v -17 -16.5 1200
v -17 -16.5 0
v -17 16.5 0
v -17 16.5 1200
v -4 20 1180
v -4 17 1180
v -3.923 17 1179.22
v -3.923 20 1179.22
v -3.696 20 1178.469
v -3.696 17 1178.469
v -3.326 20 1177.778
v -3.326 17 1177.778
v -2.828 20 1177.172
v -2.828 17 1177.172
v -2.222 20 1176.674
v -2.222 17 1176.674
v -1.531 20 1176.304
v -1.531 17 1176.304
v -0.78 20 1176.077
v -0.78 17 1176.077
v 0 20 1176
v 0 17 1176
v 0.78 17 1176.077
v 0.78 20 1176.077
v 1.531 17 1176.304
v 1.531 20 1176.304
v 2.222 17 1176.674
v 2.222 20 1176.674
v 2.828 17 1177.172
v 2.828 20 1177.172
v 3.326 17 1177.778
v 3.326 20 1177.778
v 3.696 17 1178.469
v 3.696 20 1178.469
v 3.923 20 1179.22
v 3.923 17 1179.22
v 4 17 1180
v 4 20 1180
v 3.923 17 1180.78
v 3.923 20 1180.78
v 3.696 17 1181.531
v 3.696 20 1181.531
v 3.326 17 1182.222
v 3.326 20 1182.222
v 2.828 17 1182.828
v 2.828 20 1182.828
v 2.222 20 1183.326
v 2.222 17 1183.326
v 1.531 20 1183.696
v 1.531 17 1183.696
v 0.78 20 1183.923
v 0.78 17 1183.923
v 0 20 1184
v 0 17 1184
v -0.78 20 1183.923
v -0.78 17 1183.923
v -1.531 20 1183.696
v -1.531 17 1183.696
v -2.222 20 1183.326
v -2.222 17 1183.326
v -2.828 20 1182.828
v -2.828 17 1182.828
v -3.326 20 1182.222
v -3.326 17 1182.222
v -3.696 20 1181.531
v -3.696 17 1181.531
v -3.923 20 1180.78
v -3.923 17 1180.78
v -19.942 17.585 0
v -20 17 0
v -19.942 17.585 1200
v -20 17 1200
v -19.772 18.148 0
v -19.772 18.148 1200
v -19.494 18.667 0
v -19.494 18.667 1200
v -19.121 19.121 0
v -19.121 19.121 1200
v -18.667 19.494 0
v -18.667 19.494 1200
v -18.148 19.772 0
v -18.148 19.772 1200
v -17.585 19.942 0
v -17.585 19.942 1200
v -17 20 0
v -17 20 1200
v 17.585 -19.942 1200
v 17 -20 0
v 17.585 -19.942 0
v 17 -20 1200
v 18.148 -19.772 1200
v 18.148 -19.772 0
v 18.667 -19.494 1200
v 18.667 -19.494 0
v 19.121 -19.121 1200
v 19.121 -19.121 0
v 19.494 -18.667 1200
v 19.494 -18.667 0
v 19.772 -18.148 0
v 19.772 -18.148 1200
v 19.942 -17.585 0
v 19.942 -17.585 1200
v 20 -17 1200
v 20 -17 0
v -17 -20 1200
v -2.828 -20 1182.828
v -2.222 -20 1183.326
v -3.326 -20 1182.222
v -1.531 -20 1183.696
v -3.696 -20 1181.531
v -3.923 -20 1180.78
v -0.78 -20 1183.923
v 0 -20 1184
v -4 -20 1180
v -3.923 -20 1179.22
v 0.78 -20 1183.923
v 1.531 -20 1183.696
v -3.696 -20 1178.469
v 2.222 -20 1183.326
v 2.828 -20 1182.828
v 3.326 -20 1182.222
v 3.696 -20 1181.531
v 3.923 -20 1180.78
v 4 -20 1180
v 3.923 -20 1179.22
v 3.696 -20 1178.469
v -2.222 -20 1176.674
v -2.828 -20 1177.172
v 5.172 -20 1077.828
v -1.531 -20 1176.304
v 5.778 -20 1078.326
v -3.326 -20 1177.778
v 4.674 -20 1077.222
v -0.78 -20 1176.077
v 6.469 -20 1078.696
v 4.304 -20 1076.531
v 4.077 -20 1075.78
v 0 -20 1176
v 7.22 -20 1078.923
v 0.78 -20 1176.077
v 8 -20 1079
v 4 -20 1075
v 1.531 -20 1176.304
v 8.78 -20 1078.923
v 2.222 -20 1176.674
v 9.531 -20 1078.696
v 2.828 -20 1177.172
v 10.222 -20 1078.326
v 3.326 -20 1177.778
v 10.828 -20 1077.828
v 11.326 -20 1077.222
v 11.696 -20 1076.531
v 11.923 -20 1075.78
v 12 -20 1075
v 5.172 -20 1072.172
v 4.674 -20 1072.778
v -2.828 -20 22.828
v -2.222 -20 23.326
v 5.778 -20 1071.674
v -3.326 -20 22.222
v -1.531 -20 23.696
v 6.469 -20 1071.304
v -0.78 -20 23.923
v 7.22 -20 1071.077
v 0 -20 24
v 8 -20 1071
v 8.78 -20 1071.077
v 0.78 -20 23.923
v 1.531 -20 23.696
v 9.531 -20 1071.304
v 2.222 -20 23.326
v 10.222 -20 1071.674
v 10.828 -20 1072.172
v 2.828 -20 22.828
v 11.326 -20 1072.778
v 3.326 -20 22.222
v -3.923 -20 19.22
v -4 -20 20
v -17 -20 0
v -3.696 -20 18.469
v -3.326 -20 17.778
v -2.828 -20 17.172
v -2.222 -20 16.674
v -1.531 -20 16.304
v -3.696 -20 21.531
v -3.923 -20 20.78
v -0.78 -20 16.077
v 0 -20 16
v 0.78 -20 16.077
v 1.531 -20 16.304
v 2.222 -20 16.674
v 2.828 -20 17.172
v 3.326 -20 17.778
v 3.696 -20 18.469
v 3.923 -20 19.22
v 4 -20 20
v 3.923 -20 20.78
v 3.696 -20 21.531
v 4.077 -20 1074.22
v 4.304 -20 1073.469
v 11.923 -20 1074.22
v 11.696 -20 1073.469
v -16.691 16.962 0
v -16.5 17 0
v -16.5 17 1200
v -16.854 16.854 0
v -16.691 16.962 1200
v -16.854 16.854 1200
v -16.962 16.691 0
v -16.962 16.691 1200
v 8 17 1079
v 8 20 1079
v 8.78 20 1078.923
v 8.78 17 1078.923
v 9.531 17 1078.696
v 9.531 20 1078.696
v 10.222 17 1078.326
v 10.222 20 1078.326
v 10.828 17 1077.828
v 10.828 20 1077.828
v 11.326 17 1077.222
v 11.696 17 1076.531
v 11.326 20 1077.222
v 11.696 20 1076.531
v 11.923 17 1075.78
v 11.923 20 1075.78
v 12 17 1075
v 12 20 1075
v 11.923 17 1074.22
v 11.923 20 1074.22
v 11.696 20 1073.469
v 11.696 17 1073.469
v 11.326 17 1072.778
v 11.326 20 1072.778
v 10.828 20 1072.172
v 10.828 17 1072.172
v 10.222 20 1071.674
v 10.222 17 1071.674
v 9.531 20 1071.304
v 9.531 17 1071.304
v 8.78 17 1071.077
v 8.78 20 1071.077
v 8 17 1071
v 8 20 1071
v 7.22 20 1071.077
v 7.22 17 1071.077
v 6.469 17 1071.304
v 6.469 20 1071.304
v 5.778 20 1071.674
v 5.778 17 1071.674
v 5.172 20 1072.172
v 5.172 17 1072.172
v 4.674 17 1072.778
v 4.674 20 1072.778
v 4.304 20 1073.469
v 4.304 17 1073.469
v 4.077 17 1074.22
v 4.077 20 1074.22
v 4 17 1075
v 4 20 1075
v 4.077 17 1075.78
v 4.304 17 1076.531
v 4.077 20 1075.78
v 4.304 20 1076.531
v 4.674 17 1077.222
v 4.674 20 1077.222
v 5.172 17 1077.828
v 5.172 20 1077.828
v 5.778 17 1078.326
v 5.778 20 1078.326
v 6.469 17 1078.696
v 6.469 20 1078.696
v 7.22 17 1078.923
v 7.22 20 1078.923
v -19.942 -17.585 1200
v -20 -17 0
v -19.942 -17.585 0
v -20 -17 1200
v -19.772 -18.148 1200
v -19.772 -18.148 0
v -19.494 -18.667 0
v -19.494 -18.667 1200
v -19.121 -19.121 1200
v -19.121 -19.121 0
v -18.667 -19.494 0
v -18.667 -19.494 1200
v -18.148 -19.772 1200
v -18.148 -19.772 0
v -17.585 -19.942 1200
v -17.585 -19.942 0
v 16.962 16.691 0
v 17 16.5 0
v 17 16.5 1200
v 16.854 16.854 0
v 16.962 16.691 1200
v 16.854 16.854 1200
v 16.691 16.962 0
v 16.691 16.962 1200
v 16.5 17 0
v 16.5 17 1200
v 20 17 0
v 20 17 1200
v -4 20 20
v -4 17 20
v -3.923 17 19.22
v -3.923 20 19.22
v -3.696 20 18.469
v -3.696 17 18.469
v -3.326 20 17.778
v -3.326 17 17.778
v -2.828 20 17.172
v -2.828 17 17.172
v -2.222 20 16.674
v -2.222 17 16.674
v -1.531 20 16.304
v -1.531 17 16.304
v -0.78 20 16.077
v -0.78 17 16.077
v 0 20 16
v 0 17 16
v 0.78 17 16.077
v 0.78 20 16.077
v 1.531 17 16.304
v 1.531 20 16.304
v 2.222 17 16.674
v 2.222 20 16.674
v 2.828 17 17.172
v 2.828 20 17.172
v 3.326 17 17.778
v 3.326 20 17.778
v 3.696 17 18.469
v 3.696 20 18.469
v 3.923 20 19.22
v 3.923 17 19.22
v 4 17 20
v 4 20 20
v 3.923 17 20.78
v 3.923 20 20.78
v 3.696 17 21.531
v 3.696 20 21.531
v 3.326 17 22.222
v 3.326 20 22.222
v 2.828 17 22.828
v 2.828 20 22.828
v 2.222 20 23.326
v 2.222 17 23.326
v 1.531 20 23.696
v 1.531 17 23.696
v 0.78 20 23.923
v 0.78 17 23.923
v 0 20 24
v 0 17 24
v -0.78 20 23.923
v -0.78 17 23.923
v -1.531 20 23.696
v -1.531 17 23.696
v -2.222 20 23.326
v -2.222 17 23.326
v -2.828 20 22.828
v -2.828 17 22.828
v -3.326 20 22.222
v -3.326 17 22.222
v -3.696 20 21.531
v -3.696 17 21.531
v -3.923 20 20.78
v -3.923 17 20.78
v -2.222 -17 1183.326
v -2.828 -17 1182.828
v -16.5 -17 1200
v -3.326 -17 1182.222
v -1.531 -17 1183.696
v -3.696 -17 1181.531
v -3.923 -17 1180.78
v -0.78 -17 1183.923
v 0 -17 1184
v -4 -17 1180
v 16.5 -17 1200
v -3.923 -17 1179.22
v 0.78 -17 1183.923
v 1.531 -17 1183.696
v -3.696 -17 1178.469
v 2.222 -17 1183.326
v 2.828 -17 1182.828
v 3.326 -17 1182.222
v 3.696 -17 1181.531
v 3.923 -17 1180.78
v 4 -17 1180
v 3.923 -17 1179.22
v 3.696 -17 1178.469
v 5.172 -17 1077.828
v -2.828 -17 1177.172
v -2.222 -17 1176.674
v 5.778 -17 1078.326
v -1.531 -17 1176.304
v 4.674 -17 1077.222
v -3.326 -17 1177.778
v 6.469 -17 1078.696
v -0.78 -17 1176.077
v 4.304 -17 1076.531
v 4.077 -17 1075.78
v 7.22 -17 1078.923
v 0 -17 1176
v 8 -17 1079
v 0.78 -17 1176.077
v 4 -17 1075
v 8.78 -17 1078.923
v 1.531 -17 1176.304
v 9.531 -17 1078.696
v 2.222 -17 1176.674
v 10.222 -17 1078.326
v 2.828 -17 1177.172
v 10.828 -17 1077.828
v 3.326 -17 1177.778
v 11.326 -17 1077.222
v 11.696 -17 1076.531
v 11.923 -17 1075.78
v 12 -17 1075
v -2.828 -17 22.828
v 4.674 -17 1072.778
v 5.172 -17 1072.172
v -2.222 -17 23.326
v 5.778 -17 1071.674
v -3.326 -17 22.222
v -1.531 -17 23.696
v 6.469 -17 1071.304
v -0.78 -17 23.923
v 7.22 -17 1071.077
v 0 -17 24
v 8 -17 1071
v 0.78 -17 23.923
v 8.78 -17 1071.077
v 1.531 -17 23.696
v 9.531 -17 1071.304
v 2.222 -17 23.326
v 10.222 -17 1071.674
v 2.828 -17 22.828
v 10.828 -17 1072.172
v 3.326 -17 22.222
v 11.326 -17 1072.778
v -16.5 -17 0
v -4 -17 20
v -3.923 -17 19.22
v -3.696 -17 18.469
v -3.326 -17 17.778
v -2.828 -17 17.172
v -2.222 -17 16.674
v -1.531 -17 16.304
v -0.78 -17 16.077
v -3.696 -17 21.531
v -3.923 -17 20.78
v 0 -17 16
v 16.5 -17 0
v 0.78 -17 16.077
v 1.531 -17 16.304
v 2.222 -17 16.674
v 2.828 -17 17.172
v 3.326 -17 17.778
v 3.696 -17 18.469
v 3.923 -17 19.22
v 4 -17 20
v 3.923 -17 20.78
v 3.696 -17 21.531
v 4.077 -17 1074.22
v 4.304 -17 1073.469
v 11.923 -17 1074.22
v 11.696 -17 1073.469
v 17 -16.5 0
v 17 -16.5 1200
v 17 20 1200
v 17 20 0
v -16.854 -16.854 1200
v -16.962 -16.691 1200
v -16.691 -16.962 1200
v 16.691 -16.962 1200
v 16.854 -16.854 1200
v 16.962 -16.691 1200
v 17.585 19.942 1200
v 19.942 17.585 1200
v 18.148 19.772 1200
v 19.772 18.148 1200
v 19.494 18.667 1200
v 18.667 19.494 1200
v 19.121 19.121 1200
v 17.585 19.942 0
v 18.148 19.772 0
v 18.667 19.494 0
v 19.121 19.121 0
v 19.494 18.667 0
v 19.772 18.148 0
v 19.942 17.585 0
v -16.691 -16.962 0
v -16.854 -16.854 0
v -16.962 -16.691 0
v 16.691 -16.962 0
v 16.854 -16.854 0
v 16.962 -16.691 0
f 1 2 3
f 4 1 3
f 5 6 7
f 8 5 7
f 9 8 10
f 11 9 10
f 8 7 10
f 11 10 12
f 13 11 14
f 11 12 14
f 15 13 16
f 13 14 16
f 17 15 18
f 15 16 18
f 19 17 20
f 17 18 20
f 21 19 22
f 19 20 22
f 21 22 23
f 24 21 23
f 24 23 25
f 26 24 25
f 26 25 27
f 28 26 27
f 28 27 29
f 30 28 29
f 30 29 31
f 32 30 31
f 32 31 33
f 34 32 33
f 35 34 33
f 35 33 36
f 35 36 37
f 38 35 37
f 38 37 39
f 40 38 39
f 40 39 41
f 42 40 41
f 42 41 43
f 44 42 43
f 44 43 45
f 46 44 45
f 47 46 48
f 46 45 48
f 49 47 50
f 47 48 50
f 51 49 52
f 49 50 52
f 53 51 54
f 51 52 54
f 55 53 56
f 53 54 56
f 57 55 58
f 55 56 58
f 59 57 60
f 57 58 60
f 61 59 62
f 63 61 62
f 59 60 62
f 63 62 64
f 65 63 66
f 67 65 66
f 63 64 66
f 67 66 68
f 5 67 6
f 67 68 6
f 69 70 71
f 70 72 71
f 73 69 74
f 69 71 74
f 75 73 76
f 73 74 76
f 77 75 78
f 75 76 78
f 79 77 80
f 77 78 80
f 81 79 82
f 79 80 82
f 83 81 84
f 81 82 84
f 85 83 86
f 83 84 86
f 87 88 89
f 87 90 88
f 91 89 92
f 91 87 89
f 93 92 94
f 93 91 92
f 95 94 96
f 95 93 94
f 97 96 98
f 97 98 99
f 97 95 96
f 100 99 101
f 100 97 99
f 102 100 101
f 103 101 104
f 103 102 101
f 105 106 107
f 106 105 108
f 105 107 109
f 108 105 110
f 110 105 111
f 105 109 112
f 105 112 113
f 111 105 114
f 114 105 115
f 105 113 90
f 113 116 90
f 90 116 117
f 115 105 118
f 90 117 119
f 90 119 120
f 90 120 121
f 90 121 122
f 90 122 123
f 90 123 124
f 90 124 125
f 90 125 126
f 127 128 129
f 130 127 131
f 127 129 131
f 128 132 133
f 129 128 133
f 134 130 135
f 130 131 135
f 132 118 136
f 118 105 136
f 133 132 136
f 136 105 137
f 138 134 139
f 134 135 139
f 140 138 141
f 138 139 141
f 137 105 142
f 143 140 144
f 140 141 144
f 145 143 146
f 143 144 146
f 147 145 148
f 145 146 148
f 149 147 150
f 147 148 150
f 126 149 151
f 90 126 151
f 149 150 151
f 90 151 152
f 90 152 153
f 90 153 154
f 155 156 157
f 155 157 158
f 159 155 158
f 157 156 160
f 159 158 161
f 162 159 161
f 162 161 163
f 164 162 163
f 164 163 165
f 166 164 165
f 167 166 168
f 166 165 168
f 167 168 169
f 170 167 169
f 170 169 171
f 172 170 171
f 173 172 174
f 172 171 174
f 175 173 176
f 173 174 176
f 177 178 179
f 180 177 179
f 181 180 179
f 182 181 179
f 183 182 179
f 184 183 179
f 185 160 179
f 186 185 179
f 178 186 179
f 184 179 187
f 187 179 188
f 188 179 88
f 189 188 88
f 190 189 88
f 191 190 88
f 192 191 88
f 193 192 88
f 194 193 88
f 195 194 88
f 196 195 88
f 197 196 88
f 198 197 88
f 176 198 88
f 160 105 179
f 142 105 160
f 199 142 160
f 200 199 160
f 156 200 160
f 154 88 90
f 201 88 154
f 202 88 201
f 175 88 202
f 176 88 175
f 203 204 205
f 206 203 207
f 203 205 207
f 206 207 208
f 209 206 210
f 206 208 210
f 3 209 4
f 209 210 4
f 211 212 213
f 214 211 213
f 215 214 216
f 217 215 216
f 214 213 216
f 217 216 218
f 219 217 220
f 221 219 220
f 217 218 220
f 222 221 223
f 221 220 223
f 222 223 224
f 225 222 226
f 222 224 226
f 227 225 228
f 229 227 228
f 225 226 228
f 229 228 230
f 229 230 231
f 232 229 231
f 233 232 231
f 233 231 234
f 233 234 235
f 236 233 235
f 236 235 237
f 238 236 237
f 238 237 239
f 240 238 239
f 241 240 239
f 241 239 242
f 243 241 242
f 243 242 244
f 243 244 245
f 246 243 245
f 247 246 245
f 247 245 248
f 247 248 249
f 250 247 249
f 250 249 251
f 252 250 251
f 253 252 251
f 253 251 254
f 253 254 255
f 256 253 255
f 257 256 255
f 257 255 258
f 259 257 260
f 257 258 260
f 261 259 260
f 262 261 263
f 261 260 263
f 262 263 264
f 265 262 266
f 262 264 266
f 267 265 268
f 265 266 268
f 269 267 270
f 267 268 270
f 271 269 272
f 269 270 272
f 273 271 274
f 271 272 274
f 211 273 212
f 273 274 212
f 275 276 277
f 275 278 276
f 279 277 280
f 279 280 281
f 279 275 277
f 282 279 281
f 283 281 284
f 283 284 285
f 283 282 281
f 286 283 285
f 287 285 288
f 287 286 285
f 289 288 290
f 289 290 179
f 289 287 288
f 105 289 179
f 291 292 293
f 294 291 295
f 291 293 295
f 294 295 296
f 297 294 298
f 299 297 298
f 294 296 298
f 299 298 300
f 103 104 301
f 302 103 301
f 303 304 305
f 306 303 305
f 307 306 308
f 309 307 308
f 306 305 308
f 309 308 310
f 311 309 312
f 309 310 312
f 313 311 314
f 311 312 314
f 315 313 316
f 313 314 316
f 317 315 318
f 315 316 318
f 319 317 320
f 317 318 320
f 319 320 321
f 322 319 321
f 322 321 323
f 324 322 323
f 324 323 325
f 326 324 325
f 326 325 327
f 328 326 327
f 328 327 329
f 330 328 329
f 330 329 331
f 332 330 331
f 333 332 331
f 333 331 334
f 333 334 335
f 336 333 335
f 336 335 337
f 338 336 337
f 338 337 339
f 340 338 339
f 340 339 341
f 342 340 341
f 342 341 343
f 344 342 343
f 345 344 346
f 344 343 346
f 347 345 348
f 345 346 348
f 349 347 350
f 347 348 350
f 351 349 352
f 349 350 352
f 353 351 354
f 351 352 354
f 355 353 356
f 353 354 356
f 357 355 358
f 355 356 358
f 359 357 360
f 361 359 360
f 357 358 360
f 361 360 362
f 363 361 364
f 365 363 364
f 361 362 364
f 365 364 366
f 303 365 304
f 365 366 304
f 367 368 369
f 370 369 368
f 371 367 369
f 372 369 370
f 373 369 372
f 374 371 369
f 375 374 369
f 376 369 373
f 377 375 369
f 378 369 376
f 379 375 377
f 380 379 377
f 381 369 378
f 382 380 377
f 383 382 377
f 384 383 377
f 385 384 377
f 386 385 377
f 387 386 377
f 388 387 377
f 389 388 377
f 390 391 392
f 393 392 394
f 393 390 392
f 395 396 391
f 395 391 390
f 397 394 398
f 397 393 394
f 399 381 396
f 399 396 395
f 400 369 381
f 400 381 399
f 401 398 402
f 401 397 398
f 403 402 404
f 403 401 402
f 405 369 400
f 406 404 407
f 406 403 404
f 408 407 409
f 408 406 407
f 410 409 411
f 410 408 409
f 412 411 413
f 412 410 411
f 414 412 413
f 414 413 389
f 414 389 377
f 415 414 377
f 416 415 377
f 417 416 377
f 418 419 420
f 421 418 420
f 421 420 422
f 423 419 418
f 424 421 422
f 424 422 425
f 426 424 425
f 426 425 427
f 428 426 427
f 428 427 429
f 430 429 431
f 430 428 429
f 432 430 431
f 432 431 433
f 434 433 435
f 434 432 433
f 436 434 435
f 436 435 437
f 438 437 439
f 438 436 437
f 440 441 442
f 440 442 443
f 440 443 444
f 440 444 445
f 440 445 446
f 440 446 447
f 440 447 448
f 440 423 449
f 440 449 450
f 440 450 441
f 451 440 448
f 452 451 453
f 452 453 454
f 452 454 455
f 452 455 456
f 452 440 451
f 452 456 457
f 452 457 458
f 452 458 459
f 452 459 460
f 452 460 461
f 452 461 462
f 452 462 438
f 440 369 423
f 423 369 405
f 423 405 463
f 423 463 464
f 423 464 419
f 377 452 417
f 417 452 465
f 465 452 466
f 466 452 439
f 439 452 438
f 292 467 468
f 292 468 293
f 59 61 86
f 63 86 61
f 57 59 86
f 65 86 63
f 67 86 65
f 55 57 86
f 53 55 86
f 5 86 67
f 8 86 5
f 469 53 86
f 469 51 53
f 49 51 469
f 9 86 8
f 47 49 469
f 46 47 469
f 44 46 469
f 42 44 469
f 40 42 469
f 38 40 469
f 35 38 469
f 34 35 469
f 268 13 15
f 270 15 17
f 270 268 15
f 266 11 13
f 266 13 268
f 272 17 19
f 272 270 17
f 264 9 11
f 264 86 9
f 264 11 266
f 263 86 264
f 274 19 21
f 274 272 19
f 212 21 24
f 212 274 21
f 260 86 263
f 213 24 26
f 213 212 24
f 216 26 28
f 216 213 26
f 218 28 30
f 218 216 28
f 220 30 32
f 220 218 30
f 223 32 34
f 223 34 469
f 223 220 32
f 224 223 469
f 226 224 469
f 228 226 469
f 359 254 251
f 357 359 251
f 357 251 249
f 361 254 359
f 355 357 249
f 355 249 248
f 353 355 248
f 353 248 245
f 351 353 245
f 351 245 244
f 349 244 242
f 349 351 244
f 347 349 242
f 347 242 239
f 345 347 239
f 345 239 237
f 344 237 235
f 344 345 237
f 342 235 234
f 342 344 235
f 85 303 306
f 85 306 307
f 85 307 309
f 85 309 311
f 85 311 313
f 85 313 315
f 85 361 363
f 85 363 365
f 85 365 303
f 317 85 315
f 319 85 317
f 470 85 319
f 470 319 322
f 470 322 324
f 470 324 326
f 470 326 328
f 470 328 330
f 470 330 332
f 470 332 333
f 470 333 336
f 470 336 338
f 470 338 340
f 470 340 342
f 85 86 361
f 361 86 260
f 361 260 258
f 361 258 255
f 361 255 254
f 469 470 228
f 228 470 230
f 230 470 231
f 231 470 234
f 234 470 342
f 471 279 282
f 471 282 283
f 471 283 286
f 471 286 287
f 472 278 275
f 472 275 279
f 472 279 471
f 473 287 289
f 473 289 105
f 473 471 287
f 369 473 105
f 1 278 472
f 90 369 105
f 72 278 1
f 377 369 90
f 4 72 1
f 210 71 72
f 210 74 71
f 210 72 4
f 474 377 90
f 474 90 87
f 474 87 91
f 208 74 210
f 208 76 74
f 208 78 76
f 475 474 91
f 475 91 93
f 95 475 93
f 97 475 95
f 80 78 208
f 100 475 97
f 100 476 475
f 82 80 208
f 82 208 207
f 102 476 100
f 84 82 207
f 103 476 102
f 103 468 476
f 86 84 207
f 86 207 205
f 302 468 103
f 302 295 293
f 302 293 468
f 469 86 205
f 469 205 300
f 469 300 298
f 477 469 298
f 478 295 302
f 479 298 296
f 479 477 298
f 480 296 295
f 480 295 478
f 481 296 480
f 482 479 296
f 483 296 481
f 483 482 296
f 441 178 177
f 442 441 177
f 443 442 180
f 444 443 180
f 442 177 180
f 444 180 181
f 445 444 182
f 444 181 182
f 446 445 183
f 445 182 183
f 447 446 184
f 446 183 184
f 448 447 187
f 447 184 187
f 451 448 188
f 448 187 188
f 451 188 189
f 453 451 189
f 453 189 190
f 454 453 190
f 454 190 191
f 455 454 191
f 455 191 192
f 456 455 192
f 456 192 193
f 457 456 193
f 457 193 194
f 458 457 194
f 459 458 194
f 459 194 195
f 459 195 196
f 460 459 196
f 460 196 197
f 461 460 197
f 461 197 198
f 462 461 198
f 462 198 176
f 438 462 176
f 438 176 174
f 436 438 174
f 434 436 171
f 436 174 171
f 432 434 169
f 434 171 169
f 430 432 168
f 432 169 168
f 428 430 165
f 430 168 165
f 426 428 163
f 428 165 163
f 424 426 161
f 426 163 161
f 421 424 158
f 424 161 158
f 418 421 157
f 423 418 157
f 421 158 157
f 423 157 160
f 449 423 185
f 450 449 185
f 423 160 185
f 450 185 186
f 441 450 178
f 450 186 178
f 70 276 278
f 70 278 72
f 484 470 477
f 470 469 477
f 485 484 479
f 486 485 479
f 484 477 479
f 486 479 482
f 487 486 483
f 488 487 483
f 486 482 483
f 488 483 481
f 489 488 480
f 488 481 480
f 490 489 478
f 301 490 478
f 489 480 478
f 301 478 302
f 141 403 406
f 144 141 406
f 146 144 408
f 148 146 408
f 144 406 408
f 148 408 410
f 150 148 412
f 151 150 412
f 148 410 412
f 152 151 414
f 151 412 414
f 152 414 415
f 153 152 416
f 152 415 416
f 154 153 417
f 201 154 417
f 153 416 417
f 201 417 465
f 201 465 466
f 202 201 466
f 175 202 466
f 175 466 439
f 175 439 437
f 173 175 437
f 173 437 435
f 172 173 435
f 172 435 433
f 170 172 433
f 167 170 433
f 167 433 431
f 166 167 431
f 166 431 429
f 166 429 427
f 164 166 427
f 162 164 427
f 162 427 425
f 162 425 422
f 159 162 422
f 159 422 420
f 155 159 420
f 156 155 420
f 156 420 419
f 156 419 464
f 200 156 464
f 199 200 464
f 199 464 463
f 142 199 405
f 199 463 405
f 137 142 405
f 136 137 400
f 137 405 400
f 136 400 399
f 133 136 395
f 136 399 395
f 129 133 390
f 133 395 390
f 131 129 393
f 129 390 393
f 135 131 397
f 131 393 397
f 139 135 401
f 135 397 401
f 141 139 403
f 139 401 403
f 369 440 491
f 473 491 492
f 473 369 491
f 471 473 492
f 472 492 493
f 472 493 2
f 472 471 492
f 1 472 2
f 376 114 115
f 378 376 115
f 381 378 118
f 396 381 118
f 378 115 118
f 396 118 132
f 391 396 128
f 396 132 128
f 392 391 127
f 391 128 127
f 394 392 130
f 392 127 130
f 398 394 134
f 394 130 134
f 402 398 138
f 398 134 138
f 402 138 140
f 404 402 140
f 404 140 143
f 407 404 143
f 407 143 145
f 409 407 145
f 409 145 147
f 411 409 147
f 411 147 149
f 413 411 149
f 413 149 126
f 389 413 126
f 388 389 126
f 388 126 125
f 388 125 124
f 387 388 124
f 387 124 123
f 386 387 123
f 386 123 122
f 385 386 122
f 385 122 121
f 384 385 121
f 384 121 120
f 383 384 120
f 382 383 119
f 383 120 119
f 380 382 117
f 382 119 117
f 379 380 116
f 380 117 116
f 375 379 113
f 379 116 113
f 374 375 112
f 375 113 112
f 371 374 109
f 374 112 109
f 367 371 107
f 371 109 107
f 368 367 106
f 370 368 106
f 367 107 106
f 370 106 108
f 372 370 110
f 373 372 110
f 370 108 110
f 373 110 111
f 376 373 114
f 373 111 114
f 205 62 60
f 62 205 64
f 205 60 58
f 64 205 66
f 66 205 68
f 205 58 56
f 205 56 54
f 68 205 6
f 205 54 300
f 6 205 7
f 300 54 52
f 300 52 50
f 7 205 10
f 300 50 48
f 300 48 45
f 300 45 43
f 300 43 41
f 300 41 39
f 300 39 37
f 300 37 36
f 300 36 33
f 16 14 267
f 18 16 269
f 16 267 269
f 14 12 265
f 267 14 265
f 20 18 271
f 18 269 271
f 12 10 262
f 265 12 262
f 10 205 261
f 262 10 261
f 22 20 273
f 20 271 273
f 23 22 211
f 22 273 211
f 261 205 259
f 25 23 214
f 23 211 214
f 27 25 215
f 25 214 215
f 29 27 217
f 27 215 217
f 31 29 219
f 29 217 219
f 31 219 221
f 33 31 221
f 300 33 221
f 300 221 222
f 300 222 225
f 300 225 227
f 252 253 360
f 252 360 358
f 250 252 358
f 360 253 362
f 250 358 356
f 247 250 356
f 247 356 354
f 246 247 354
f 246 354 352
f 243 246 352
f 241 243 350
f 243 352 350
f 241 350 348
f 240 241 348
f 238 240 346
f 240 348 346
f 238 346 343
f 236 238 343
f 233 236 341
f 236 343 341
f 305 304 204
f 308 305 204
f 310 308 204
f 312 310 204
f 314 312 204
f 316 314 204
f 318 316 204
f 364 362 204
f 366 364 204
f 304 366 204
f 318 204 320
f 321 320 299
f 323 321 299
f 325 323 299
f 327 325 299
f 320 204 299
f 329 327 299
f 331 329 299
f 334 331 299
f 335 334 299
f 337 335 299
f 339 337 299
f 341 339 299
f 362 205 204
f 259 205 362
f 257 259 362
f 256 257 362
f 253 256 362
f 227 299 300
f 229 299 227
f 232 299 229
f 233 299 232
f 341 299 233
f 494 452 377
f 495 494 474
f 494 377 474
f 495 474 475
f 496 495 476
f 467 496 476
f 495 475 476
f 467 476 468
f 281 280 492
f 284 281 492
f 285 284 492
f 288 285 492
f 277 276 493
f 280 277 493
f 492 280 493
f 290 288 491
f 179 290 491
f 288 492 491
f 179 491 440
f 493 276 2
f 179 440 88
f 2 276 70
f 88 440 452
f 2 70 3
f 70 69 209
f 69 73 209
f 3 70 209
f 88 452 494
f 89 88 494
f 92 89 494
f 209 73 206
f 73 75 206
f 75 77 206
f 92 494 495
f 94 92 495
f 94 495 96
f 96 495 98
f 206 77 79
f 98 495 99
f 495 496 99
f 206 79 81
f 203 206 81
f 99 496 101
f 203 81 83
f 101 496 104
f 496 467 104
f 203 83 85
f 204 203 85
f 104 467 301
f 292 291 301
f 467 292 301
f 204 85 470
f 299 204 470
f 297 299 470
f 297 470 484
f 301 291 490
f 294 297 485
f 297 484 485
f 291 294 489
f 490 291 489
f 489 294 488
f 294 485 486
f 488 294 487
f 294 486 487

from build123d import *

# Parameters (mm, degrees)
SKETCH1_W                = 40
SKETCH1_H                = 40
SKETCH1_W_2              = 34
SKETCH1_H_2              = 34
EXTRUDE_THIN1_DEPTH      = 1200
FILLET1_R                = 0.5
FILLET2_R                = 3
F_8_0_8_DIAMETER_HOLE1_D = 8
SKETCH5_R                = 4
CUT_EXTRUDE1_DEPTH       = 1201.833044182


with BuildPart() as part:
    # Sketch1 → Extrude-Thin1 (new body)
    with BuildSketch(Plane.XY):
        Rectangle(SKETCH1_W, SKETCH1_H)
        Rectangle(SKETCH1_W_2, SKETCH1_H_2, mode=Mode.SUBTRACT)
    extrude(amount=EXTRUDE_THIN1_DEPTH)

    # Fillet1
    fillet1_edges = [part.edges().sort_by_distance(p)[0] for p in [
        (17, -17, 600),
        (17, 17, 600),
        (-17, 17, 600),
        (-17, -17, 600),
    ]]
    fillet(fillet1_edges, radius=FILLET1_R)

    # Fillet2
    fillet2_edges = [part.edges().sort_by_distance(p)[0] for p in [
        (20, -20, 600),
        (-20, -20, 600),
        (-20, 20, 600),
        (20, 20, 600),
    ]]
    fillet(fillet2_edges, radius=FILLET2_R)

    # Ø8.0 (8) Diameter Hole1 (through all)
    with Locations(Plane(origin=(0, 20, 0), x_dir=(1, 0, 0), z_dir=(0, 1, 0))):
        with Locations((0, -20), (0, -1180)):
            Hole(F_8_0_8_DIAMETER_HOLE1_D / 2)

    # Sketch5 → Cut-Extrude1 (cut, through all)
    with BuildSketch(Plane(origin=(0, 20, 0), x_dir=(1, 0, 0), z_dir=(0, 1, 0))):
        with Locations(Location((8, -1075, 0), (0, 0, 270))):
            Circle(SKETCH5_R)
    extrude(amount=-CUT_EXTRUDE1_DEPTH, mode=Mode.SUBTRACT)


solid = part.part
